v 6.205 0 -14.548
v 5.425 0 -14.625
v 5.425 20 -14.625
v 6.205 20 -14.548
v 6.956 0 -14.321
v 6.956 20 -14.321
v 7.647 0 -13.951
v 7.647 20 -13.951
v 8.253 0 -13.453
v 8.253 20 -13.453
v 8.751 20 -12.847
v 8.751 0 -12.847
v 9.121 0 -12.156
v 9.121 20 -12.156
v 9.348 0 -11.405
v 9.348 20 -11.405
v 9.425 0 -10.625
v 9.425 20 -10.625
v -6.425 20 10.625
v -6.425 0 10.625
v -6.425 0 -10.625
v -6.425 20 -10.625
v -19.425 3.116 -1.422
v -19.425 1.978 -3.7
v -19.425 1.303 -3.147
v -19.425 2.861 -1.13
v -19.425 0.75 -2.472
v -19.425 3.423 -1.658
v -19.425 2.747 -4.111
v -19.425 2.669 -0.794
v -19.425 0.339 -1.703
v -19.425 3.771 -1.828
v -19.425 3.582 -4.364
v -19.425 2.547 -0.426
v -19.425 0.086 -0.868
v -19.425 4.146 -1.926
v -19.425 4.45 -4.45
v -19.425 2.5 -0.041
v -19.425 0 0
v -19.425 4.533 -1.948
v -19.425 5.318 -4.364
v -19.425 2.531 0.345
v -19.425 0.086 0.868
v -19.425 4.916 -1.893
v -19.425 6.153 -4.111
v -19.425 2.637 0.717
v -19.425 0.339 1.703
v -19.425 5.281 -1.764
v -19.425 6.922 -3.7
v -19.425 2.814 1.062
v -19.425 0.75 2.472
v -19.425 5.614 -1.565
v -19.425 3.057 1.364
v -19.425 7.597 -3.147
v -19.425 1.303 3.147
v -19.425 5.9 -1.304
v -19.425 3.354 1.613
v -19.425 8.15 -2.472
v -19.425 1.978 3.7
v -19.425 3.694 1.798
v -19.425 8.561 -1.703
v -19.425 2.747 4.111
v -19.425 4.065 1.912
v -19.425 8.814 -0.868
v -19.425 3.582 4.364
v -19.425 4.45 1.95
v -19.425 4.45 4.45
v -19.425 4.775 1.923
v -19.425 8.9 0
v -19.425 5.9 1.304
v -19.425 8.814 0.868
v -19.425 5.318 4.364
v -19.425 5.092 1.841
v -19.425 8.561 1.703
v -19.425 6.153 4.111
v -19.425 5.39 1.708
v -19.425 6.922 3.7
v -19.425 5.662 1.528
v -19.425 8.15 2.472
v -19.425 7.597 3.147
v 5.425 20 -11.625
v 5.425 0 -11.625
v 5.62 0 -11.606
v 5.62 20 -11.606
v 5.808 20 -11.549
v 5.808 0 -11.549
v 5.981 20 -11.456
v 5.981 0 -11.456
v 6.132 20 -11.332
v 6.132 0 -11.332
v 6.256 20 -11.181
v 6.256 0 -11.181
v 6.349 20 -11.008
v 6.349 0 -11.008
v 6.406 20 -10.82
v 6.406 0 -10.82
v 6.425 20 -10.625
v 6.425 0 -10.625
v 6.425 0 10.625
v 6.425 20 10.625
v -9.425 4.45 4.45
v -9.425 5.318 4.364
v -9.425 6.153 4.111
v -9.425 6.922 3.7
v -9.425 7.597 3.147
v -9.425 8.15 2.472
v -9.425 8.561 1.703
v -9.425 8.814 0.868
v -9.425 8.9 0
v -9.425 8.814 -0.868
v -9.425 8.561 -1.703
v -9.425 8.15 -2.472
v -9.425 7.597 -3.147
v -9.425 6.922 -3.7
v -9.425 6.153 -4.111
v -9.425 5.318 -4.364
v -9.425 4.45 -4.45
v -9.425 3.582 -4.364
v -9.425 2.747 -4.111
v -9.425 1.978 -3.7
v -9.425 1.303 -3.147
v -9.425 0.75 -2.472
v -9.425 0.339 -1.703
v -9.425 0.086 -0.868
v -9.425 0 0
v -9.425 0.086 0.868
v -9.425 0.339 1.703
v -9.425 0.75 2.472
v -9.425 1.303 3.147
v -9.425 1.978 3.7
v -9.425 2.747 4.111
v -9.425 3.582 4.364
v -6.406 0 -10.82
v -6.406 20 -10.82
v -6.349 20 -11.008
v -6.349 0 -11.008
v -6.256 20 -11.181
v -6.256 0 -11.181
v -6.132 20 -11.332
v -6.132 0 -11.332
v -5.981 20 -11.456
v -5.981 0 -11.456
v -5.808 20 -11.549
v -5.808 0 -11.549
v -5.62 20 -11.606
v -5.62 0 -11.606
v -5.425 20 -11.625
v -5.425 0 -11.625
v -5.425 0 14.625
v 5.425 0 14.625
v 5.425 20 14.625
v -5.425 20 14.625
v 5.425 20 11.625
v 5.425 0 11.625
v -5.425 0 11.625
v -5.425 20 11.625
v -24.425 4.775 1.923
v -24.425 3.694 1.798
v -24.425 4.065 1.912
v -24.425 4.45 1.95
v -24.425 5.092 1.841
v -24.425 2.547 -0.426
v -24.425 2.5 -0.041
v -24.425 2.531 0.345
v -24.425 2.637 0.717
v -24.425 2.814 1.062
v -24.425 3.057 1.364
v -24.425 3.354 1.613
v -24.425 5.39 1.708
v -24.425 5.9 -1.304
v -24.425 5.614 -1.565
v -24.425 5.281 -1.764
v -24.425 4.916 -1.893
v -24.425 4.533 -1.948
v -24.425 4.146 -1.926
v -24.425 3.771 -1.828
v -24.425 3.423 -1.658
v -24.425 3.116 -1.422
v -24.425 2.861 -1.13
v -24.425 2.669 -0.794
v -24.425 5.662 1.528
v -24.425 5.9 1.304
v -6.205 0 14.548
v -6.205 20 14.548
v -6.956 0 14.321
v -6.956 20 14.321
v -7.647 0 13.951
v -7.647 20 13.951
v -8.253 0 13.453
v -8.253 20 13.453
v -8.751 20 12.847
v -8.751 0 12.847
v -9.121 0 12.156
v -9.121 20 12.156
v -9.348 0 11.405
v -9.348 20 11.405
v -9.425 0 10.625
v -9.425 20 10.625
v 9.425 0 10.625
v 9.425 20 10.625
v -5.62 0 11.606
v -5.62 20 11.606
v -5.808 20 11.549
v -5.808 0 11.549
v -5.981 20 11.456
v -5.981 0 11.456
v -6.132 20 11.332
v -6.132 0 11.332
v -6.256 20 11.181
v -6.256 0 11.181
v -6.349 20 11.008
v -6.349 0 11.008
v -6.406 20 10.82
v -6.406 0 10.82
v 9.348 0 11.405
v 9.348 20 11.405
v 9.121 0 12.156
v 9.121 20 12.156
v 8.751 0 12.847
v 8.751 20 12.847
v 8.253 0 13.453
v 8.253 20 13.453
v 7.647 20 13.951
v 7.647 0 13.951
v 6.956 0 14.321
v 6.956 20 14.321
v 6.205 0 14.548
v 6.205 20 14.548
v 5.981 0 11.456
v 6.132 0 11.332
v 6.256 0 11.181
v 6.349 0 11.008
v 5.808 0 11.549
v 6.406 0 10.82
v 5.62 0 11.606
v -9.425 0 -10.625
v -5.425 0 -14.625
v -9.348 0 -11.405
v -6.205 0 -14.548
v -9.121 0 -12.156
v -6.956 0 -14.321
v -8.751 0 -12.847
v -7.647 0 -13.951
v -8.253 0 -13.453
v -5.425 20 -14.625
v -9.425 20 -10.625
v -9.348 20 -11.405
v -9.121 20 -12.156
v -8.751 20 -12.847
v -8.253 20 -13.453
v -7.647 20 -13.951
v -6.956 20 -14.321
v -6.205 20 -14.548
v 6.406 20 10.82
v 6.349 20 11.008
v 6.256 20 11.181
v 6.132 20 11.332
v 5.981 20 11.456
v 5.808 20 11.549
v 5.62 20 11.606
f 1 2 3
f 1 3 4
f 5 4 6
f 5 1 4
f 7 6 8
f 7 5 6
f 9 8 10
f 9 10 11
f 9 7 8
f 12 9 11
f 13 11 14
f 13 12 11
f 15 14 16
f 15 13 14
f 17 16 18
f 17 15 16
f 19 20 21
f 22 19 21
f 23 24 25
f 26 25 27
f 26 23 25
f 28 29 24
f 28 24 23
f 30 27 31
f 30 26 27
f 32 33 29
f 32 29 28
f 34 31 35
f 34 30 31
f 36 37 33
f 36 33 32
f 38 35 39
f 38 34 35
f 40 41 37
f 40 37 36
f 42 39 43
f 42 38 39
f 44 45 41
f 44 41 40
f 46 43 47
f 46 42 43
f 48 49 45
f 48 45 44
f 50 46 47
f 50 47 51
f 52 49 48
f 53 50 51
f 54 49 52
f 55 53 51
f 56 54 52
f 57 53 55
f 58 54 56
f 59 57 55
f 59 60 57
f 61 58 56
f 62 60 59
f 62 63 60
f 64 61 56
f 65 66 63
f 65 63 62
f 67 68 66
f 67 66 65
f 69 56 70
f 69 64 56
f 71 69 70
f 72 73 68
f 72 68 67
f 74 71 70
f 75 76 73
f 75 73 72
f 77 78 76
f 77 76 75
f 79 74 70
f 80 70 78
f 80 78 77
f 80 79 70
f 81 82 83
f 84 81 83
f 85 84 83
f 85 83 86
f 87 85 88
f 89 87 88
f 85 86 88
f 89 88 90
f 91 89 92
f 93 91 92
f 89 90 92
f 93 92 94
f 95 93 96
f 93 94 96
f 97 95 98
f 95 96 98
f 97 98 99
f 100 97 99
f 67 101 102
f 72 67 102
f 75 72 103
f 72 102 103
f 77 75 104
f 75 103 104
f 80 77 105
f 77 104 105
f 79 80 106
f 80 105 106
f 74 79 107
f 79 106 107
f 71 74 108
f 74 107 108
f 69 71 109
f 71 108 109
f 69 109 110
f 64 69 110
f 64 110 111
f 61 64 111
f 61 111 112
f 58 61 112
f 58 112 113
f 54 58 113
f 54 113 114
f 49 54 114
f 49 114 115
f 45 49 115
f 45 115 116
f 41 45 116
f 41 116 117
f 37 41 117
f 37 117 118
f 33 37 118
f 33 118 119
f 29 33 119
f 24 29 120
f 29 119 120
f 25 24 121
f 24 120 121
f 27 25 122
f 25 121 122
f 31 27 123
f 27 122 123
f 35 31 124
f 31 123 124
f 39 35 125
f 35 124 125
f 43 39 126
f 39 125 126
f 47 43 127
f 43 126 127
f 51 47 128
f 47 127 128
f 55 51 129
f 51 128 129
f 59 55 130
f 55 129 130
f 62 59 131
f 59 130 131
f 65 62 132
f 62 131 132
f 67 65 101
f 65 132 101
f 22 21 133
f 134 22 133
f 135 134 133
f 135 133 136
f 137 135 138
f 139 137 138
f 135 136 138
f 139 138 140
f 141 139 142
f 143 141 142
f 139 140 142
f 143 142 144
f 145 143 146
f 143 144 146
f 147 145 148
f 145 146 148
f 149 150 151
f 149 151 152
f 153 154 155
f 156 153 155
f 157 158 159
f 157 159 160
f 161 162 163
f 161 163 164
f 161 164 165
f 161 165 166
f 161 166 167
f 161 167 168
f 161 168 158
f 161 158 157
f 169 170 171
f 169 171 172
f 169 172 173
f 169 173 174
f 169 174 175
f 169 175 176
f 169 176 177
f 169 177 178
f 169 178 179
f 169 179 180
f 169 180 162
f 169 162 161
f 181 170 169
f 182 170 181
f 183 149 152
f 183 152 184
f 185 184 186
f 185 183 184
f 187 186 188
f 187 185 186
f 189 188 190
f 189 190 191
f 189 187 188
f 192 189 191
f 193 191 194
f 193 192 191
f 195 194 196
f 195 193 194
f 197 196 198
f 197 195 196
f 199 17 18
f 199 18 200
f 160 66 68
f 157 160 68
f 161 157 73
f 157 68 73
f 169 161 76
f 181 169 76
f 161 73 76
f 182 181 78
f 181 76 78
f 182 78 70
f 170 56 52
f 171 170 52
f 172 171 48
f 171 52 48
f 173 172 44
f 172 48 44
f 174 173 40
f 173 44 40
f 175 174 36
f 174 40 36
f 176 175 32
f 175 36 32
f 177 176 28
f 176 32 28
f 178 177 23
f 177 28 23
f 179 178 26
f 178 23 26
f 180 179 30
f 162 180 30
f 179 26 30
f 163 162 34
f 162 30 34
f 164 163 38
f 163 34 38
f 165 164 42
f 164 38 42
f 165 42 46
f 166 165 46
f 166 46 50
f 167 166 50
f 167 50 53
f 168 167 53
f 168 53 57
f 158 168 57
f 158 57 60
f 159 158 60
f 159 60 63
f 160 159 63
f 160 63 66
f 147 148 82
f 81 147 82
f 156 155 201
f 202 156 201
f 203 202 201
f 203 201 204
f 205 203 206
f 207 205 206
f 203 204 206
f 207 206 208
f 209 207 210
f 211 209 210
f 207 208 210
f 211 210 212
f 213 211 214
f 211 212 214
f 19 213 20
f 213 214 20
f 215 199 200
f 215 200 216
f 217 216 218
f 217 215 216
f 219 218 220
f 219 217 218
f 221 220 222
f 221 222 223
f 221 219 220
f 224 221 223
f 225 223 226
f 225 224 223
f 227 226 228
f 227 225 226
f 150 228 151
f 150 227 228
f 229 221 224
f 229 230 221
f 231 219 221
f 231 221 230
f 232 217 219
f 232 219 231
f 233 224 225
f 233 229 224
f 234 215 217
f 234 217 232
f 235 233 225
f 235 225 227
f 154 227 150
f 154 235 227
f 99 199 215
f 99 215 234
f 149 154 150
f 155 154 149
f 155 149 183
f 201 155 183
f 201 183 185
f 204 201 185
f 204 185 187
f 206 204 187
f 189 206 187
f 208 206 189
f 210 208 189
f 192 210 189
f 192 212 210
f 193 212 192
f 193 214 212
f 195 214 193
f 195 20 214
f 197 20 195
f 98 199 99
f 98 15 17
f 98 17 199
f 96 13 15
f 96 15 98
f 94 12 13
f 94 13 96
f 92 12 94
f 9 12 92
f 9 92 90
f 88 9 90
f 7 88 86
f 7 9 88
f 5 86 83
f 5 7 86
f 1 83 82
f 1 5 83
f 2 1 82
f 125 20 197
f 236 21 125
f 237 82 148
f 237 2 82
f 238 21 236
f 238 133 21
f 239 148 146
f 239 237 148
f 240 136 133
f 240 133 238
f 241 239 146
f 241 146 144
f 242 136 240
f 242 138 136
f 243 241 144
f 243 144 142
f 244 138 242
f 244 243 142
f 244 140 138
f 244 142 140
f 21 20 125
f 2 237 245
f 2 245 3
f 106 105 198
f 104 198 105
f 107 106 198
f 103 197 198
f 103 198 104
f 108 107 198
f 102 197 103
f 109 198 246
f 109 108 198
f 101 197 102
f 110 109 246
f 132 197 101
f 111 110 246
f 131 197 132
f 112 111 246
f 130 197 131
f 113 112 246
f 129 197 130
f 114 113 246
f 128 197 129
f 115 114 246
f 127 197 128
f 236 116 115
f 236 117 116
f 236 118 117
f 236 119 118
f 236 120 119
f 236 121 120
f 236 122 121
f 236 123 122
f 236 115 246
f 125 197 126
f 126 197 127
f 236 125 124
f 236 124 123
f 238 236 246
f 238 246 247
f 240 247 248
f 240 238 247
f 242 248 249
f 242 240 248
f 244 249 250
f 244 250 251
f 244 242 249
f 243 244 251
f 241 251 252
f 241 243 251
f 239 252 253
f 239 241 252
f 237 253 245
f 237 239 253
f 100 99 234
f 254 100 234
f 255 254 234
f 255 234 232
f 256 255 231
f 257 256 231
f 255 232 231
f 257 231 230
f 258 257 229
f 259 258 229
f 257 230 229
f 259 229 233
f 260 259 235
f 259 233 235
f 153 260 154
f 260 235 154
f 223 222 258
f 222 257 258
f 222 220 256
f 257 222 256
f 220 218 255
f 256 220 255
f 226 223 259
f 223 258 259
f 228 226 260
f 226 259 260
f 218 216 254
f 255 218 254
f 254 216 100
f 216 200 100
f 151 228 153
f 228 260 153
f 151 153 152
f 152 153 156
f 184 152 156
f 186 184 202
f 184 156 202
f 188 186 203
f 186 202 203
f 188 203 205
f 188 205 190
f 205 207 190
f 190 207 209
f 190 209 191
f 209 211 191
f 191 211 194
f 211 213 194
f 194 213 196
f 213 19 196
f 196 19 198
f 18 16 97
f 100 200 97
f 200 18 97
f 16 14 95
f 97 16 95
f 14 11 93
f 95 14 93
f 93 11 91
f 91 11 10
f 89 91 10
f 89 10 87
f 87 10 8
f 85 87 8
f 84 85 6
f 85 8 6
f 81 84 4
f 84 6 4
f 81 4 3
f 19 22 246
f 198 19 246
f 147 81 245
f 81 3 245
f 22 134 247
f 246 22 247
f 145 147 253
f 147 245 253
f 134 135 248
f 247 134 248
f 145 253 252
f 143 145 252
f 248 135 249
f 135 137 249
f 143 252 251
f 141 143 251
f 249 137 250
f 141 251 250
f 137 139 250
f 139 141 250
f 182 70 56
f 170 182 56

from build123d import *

# Parameters (mm, degrees)
BOSS_EXTRUDE1_DEPTH = 20
SKETCH2_R           = 4.45
BOSS_EXTRUDE2_DEPTH = 10
BOSS_EXTRUDE3_DEPTH = 15


with BuildPart() as part:
    # Sketch1 → Boss-Extrude1 (new body)
    with BuildSketch(Plane(origin=(0, 0, 0), x_dir=(1, 0, 0), z_dir=(0, 1, 0))):
        with BuildLine():
            Line((-5.425, 14.625), (5.425, 14.625))
            ThreePointArc((5.425, 14.625), (8.253427125, 13.453427125), (9.425, 10.625))
            Line((9.425, 10.625), (9.425, -10.625))
            ThreePointArc((9.425, -10.625), (8.253427125, -13.453427125), (5.425, -14.625))
            Line((5.425, -14.625), (-5.425, -14.625))
            ThreePointArc((-5.425, -14.625), (-8.253427125, -13.453427125), (-9.425, -10.625))
            Line((-9.425, -10.625), (-9.425, 10.625))
            ThreePointArc((-9.425, 10.625), (-8.253427125, 13.453427125), (-5.425, 14.625))
        make_face()
        with BuildLine():
            Line((-5.425, 11.625), (5.425, 11.625))
            ThreePointArc((5.425, 11.625), (6.132106781, 11.332106781), (6.425, 10.625))
            Line((6.425, 10.625), (6.425, -10.625))
            ThreePointArc((6.425, -10.625), (6.132106781, -11.332106781), (5.425, -11.625))
            Line((5.425, -11.625), (-5.425, -11.625))
            ThreePointArc((-5.425, -11.625), (-6.132106781, -11.332106781), (-6.425, -10.625))
            Line((-6.425, -10.625), (-6.425, 10.625))
            ThreePointArc((-6.425, 10.625), (-6.132106781, 11.332106781), (-5.425, 11.625))
        make_face(mode=Mode.SUBTRACT)
    extrude(amount=BOSS_EXTRUDE1_DEPTH)

    # Sketch2 → Boss-Extrude2 (add)
    with BuildSketch(Plane.ZY.offset(9.425)):
        with Locations((0, 4.45)):
            Circle(SKETCH2_R)
        with BuildLine():
            Line((-1.303840481, 5.9), (1.303840481, 5.9))
            ThreePointArc((1.303840481, 5.9), (0, 2.5), (-1.303840481, 5.9))
        make_face(mode=Mode.SUBTRACT)
    extrude(amount=BOSS_EXTRUDE2_DEPTH)

    # Sketch2<4> → Boss-Extrude3 (add)
    with BuildSketch(Plane.ZY.offset(9.425)):
        with BuildLine():
            ThreePointArc((1.95, 4.45), (1.78114976, 5.243728878), (1.303840481, 5.9))
            Line((1.303840481, 5.9), (-1.303840481, 5.9))
            ThreePointArc((-1.303840481, 5.9), (-0.793728878, 2.66885024), (1.95, 4.45))
        make_face()
    extrude(amount=BOSS_EXTRUDE3_DEPTH)


solid = part.part
